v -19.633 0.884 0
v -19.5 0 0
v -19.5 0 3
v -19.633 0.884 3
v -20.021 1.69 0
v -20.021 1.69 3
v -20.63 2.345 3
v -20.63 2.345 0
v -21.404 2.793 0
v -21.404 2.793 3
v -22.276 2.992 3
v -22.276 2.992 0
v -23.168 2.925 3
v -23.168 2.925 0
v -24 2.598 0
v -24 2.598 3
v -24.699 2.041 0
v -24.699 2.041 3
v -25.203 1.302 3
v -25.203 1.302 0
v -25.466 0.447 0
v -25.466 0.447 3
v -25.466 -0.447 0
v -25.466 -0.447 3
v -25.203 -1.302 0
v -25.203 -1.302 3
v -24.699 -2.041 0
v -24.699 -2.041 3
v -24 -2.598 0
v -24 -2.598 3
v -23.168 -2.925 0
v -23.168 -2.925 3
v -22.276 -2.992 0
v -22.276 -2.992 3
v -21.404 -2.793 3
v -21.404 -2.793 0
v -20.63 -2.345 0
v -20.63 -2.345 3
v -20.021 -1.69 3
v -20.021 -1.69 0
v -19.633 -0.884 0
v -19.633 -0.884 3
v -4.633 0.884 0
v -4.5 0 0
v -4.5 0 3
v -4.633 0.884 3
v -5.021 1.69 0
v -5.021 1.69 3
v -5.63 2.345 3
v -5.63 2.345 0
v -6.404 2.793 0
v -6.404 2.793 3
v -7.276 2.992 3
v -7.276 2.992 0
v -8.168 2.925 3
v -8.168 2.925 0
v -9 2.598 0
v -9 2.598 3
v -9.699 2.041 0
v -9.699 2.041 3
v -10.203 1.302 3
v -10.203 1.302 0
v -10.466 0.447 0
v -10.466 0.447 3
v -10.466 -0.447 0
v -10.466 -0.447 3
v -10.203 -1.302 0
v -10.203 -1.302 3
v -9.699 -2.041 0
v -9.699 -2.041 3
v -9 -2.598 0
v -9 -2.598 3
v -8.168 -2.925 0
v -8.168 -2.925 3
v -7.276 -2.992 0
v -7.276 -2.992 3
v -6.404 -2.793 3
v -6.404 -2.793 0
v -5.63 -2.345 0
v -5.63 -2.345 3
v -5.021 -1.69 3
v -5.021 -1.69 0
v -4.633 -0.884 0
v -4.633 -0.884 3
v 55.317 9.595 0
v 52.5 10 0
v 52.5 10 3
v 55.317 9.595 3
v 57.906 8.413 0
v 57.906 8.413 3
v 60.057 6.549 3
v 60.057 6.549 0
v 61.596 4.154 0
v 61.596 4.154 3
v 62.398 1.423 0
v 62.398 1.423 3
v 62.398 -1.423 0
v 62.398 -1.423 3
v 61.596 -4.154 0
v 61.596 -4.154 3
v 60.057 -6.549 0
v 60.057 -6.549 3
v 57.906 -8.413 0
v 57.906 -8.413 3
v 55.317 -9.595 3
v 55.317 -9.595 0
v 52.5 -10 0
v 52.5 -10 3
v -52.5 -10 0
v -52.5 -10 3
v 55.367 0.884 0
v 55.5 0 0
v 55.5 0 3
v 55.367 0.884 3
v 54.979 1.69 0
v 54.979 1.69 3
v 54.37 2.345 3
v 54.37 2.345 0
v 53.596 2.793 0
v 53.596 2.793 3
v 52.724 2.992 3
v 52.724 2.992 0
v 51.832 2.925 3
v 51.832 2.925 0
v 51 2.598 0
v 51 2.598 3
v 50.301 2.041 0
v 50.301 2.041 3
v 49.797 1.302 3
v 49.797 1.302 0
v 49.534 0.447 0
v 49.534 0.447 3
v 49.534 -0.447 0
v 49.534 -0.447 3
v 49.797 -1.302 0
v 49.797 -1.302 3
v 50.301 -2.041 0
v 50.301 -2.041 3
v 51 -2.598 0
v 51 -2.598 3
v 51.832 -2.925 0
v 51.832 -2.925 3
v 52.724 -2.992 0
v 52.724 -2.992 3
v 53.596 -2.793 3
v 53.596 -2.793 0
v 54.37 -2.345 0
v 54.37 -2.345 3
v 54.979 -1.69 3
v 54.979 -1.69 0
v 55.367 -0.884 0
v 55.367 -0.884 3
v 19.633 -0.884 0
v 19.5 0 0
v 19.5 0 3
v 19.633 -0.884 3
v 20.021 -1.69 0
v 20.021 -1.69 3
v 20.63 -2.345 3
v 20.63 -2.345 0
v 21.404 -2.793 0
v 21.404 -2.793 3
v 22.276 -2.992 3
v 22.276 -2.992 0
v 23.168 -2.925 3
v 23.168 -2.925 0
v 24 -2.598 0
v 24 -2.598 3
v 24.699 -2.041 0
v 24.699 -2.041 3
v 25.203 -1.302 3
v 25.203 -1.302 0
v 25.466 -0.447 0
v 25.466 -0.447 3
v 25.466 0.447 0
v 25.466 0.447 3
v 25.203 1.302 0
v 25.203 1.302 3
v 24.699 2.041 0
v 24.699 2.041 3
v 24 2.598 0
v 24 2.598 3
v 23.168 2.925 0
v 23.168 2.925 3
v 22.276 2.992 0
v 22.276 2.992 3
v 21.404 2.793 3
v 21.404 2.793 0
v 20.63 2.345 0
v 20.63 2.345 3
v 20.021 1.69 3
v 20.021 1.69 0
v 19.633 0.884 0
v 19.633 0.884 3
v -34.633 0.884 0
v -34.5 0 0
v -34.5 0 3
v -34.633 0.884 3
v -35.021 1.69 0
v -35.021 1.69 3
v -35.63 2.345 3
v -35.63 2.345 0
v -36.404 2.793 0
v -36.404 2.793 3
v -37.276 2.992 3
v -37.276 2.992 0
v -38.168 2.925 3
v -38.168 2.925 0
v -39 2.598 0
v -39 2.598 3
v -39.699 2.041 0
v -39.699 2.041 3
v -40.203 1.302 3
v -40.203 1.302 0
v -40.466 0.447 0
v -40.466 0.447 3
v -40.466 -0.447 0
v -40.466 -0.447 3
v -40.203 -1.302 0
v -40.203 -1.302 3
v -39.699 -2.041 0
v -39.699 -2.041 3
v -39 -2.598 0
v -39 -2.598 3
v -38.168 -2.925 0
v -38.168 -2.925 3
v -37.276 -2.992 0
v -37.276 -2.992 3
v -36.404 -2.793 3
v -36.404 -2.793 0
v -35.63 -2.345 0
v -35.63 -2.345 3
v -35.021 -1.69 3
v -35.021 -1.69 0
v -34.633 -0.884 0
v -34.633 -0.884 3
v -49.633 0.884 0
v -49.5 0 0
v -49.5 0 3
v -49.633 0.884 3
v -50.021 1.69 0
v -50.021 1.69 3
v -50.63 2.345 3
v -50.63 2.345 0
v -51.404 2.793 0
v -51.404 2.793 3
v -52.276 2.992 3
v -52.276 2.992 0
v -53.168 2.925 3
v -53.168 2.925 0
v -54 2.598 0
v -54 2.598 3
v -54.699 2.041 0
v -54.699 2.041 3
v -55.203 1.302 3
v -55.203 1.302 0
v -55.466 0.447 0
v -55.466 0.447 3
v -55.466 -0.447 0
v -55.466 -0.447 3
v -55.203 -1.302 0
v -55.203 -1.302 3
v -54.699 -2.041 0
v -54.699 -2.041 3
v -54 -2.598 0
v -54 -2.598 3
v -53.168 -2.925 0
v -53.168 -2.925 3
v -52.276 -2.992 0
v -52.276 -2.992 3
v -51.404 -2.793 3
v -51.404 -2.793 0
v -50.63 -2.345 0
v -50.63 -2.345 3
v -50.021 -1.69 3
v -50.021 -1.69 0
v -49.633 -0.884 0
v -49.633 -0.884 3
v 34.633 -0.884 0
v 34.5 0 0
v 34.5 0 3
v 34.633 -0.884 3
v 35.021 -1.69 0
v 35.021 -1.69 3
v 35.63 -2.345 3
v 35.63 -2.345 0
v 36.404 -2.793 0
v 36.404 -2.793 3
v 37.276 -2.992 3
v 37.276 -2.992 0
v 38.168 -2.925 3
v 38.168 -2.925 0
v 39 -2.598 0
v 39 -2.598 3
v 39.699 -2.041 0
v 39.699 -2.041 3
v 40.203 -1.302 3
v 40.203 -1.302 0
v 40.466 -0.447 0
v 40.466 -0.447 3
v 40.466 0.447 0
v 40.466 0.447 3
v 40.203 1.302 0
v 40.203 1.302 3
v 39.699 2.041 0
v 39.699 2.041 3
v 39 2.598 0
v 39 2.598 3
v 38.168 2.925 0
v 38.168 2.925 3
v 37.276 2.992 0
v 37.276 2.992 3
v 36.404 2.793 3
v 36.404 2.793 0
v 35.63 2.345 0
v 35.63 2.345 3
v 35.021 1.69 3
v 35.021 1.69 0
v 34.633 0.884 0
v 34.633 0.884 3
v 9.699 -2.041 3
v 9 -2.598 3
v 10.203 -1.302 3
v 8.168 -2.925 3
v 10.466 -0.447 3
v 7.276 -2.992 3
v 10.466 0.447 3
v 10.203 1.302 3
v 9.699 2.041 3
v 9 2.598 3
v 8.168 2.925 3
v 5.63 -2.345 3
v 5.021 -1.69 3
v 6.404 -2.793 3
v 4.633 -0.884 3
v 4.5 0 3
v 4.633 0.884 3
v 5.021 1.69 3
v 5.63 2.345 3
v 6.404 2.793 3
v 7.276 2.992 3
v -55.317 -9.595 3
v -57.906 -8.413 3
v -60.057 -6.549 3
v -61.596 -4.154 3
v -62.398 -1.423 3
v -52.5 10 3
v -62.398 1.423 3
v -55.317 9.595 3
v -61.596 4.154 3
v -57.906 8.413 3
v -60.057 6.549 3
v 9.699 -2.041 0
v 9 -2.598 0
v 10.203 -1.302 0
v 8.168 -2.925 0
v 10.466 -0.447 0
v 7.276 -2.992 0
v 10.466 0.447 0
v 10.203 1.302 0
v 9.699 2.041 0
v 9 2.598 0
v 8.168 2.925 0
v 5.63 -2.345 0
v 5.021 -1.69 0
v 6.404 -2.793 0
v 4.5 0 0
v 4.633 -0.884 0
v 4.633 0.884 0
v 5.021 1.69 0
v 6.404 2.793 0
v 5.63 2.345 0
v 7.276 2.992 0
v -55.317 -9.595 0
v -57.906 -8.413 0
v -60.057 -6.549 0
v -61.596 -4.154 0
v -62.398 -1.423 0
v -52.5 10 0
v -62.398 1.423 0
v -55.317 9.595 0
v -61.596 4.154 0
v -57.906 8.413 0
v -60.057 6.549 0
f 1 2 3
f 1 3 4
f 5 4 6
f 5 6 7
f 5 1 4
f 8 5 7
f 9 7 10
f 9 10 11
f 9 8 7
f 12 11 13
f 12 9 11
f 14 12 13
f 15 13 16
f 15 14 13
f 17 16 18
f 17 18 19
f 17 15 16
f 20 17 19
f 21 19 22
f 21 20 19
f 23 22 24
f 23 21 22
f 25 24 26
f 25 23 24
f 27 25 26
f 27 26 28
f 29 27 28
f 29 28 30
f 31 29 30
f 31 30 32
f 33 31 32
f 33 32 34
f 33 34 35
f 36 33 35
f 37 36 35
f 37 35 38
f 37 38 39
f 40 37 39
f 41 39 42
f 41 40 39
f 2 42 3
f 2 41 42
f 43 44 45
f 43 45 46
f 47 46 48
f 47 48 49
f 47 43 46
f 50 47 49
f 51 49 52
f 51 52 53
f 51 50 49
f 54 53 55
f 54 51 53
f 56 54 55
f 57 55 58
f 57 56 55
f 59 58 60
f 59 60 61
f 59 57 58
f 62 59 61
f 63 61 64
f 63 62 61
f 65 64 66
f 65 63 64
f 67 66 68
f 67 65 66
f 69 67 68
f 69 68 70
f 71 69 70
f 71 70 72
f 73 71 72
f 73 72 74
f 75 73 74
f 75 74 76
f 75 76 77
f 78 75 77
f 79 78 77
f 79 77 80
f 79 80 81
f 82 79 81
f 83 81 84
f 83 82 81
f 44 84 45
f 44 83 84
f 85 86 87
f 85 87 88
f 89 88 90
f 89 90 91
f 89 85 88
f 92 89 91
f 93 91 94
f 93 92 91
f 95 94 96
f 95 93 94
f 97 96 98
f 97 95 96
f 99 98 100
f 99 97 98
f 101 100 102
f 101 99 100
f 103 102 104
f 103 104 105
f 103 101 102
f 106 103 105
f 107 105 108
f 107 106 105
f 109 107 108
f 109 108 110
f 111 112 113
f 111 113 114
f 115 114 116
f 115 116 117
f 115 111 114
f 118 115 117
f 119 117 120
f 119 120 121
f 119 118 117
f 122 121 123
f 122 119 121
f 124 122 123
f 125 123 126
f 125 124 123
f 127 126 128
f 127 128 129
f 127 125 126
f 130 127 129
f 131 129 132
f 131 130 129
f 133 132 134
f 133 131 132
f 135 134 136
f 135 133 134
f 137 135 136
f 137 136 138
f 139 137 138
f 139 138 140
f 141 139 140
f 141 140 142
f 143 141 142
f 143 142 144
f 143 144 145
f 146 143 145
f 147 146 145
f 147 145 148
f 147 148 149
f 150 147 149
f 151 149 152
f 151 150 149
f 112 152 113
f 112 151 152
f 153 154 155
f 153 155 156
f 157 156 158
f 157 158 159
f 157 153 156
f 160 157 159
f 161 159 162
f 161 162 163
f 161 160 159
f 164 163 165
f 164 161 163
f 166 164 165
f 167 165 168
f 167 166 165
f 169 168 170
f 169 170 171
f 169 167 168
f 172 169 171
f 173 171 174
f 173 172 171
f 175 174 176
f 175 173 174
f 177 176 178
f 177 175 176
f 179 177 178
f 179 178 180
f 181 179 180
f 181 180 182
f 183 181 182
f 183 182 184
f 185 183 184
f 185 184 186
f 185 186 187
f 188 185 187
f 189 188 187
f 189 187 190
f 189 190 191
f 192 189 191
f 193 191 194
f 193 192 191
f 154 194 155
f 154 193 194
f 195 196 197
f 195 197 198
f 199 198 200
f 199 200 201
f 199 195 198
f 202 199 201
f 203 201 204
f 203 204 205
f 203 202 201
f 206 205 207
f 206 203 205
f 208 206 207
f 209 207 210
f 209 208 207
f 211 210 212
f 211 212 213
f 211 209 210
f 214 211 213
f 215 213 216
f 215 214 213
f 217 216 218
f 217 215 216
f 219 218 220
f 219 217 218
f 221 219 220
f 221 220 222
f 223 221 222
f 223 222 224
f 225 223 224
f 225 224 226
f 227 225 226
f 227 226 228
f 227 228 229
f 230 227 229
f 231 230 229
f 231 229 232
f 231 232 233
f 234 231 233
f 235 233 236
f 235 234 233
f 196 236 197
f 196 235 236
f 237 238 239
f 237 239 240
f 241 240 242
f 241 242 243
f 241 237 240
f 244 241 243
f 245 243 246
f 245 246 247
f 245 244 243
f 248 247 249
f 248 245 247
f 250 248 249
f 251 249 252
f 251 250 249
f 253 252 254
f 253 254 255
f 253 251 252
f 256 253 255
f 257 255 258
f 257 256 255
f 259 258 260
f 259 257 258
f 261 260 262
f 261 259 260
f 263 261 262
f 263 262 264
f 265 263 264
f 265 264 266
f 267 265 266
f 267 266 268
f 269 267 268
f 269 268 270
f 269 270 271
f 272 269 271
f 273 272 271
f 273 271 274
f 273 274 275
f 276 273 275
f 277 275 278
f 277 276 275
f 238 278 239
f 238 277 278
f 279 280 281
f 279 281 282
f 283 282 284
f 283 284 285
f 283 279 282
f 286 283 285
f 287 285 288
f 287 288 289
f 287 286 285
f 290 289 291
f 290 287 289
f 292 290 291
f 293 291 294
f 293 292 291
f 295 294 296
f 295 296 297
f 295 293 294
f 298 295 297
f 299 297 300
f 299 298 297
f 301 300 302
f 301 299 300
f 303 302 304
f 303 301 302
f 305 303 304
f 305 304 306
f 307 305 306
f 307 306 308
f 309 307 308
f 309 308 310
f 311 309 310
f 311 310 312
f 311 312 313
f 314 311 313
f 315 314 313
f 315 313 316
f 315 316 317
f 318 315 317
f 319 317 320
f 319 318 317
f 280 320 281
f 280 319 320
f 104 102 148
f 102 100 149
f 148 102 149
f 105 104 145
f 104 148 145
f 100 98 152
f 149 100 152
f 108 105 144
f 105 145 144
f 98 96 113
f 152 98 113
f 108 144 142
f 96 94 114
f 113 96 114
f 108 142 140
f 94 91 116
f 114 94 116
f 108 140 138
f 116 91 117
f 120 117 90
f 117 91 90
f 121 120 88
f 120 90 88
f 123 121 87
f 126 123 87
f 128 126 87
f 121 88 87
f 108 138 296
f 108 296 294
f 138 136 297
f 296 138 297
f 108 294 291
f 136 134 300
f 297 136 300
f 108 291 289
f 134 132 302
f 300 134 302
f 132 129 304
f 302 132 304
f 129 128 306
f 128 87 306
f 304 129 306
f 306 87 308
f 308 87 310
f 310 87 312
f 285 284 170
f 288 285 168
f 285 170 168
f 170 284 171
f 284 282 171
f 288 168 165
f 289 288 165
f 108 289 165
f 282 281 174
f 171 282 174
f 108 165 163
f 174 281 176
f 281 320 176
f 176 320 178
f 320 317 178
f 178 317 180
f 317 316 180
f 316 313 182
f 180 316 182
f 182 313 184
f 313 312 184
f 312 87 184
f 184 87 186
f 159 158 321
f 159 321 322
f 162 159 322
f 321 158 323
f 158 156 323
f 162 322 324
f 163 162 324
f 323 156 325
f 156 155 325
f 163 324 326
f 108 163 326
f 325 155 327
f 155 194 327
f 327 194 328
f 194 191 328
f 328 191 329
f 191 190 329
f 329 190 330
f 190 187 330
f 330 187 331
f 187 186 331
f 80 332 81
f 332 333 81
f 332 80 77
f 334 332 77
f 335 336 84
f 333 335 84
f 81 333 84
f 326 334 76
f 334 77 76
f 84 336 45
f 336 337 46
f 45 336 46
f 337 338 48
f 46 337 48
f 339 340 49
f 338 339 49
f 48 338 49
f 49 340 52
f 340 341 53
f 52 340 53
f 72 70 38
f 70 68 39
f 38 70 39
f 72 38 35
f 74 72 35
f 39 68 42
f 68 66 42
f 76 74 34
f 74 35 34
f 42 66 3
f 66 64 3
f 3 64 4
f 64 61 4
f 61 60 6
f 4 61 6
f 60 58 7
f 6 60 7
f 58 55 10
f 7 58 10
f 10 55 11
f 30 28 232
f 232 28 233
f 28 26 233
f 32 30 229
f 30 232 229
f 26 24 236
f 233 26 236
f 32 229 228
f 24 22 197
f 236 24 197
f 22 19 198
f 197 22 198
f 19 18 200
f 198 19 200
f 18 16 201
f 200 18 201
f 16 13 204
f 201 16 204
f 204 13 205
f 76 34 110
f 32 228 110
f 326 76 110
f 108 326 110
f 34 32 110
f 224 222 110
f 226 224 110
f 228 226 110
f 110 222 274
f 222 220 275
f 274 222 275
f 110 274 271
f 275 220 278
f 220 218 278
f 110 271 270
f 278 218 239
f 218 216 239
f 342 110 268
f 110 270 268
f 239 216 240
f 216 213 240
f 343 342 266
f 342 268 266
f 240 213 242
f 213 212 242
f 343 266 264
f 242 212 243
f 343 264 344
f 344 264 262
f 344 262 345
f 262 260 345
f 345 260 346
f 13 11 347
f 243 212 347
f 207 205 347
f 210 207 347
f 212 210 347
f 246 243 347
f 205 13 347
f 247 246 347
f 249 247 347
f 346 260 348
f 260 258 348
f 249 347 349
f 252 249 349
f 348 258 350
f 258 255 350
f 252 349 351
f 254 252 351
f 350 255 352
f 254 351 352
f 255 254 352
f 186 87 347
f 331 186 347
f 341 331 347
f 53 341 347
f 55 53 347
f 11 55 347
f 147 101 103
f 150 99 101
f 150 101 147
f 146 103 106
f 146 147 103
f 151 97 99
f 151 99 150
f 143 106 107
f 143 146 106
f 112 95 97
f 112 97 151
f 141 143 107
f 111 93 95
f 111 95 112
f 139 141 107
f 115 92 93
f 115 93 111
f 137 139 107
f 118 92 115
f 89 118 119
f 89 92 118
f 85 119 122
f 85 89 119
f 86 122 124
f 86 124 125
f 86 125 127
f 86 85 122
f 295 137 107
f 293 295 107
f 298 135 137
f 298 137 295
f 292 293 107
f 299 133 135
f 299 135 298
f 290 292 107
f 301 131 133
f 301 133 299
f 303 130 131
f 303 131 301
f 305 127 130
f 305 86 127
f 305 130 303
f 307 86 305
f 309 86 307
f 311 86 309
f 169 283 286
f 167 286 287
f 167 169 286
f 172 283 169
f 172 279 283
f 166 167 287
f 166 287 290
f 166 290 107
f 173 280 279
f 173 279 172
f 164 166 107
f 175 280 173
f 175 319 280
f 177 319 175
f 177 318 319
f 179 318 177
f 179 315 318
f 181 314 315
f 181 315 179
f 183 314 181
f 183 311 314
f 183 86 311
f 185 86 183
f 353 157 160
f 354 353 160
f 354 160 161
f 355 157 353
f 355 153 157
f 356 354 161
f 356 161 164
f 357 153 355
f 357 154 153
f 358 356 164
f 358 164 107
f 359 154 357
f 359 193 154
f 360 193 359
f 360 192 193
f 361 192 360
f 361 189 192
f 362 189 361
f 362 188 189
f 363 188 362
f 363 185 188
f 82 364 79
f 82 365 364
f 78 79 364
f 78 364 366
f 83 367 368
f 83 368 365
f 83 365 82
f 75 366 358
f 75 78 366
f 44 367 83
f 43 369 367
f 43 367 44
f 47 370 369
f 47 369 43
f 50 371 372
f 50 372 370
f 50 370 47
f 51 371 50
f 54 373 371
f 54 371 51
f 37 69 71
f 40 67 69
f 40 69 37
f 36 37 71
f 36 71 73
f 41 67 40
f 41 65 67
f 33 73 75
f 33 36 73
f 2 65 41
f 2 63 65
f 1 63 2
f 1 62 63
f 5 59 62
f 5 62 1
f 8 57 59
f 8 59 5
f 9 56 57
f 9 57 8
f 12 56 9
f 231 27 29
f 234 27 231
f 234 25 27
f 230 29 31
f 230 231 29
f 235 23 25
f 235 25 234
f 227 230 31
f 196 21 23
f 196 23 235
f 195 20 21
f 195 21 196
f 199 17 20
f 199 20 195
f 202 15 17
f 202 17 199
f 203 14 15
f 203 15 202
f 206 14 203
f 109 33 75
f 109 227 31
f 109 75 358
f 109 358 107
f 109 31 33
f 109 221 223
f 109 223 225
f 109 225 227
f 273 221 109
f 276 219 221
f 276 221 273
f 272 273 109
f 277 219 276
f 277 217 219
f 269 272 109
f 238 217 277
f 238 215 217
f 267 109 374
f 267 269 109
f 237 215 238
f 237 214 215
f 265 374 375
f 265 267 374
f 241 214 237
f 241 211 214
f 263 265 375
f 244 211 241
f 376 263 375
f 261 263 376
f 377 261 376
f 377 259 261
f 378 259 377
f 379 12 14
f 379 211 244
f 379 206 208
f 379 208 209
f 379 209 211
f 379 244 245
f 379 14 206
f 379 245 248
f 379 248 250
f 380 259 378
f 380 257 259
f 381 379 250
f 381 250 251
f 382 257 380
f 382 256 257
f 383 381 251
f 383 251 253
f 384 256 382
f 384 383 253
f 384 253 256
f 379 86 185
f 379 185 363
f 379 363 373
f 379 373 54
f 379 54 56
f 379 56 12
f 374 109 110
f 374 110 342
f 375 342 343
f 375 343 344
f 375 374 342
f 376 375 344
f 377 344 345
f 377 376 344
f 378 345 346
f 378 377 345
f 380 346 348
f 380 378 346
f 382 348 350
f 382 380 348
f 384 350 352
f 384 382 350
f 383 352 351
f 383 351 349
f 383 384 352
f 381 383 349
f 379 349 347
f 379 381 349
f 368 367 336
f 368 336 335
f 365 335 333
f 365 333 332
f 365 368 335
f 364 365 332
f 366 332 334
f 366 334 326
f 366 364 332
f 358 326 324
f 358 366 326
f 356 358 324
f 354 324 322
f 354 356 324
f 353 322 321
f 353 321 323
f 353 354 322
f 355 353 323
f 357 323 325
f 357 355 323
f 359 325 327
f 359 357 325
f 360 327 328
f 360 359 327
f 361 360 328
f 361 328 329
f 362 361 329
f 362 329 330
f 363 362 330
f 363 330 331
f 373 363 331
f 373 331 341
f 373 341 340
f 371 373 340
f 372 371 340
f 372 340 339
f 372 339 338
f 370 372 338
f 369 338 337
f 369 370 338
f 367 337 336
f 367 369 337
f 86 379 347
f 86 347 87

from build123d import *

# Parameters (mm, degrees)
SKETCH3_R           = 3
BOSS_EXTRUDE1_DEPTH = 3


with BuildPart() as part:
    # Sketch3 → Boss-Extrude1 (new body)
    with BuildSketch(Plane.XY):
        with BuildLine():
            Line((-52.5, 10), (52.5, 10))
            ThreePointArc((52.5, 10), (62.5, 0), (52.5, -10))
            Line((52.5, -10), (-52.5, -10))
            ThreePointArc((-52.5, -10), (-62.5, 0), (-52.5, 10))
        make_face()
        with Locations((52.5, 0)):
            Circle(SKETCH3_R, mode=Mode.SUBTRACT)
        with Locations((-52.5, 0)):
            Circle(SKETCH3_R, mode=Mode.SUBTRACT)
        with Locations((-37.5, 0)):
            Circle(SKETCH3_R, mode=Mode.SUBTRACT)
        with Locations((-22.5, 0)):
            Circle(SKETCH3_R, mode=Mode.SUBTRACT)
        with Locations((-7.5, 0)):
            Circle(SKETCH3_R, mode=Mode.SUBTRACT)
        with Locations(Location((7.5, 0, 0), (0, 0, 180))):
            Circle(SKETCH3_R, mode=Mode.SUBTRACT)
        with Locations(Location((22.5, 0, 0), (0, 0, 180))):
            Circle(SKETCH3_R, mode=Mode.SUBTRACT)
        with Locations(Location((37.5, 0, 0), (0, 0, 180))):
            Circle(SKETCH3_R, mode=Mode.SUBTRACT)
    extrude(amount=BOSS_EXTRUDE1_DEPTH)


solid = part.part
